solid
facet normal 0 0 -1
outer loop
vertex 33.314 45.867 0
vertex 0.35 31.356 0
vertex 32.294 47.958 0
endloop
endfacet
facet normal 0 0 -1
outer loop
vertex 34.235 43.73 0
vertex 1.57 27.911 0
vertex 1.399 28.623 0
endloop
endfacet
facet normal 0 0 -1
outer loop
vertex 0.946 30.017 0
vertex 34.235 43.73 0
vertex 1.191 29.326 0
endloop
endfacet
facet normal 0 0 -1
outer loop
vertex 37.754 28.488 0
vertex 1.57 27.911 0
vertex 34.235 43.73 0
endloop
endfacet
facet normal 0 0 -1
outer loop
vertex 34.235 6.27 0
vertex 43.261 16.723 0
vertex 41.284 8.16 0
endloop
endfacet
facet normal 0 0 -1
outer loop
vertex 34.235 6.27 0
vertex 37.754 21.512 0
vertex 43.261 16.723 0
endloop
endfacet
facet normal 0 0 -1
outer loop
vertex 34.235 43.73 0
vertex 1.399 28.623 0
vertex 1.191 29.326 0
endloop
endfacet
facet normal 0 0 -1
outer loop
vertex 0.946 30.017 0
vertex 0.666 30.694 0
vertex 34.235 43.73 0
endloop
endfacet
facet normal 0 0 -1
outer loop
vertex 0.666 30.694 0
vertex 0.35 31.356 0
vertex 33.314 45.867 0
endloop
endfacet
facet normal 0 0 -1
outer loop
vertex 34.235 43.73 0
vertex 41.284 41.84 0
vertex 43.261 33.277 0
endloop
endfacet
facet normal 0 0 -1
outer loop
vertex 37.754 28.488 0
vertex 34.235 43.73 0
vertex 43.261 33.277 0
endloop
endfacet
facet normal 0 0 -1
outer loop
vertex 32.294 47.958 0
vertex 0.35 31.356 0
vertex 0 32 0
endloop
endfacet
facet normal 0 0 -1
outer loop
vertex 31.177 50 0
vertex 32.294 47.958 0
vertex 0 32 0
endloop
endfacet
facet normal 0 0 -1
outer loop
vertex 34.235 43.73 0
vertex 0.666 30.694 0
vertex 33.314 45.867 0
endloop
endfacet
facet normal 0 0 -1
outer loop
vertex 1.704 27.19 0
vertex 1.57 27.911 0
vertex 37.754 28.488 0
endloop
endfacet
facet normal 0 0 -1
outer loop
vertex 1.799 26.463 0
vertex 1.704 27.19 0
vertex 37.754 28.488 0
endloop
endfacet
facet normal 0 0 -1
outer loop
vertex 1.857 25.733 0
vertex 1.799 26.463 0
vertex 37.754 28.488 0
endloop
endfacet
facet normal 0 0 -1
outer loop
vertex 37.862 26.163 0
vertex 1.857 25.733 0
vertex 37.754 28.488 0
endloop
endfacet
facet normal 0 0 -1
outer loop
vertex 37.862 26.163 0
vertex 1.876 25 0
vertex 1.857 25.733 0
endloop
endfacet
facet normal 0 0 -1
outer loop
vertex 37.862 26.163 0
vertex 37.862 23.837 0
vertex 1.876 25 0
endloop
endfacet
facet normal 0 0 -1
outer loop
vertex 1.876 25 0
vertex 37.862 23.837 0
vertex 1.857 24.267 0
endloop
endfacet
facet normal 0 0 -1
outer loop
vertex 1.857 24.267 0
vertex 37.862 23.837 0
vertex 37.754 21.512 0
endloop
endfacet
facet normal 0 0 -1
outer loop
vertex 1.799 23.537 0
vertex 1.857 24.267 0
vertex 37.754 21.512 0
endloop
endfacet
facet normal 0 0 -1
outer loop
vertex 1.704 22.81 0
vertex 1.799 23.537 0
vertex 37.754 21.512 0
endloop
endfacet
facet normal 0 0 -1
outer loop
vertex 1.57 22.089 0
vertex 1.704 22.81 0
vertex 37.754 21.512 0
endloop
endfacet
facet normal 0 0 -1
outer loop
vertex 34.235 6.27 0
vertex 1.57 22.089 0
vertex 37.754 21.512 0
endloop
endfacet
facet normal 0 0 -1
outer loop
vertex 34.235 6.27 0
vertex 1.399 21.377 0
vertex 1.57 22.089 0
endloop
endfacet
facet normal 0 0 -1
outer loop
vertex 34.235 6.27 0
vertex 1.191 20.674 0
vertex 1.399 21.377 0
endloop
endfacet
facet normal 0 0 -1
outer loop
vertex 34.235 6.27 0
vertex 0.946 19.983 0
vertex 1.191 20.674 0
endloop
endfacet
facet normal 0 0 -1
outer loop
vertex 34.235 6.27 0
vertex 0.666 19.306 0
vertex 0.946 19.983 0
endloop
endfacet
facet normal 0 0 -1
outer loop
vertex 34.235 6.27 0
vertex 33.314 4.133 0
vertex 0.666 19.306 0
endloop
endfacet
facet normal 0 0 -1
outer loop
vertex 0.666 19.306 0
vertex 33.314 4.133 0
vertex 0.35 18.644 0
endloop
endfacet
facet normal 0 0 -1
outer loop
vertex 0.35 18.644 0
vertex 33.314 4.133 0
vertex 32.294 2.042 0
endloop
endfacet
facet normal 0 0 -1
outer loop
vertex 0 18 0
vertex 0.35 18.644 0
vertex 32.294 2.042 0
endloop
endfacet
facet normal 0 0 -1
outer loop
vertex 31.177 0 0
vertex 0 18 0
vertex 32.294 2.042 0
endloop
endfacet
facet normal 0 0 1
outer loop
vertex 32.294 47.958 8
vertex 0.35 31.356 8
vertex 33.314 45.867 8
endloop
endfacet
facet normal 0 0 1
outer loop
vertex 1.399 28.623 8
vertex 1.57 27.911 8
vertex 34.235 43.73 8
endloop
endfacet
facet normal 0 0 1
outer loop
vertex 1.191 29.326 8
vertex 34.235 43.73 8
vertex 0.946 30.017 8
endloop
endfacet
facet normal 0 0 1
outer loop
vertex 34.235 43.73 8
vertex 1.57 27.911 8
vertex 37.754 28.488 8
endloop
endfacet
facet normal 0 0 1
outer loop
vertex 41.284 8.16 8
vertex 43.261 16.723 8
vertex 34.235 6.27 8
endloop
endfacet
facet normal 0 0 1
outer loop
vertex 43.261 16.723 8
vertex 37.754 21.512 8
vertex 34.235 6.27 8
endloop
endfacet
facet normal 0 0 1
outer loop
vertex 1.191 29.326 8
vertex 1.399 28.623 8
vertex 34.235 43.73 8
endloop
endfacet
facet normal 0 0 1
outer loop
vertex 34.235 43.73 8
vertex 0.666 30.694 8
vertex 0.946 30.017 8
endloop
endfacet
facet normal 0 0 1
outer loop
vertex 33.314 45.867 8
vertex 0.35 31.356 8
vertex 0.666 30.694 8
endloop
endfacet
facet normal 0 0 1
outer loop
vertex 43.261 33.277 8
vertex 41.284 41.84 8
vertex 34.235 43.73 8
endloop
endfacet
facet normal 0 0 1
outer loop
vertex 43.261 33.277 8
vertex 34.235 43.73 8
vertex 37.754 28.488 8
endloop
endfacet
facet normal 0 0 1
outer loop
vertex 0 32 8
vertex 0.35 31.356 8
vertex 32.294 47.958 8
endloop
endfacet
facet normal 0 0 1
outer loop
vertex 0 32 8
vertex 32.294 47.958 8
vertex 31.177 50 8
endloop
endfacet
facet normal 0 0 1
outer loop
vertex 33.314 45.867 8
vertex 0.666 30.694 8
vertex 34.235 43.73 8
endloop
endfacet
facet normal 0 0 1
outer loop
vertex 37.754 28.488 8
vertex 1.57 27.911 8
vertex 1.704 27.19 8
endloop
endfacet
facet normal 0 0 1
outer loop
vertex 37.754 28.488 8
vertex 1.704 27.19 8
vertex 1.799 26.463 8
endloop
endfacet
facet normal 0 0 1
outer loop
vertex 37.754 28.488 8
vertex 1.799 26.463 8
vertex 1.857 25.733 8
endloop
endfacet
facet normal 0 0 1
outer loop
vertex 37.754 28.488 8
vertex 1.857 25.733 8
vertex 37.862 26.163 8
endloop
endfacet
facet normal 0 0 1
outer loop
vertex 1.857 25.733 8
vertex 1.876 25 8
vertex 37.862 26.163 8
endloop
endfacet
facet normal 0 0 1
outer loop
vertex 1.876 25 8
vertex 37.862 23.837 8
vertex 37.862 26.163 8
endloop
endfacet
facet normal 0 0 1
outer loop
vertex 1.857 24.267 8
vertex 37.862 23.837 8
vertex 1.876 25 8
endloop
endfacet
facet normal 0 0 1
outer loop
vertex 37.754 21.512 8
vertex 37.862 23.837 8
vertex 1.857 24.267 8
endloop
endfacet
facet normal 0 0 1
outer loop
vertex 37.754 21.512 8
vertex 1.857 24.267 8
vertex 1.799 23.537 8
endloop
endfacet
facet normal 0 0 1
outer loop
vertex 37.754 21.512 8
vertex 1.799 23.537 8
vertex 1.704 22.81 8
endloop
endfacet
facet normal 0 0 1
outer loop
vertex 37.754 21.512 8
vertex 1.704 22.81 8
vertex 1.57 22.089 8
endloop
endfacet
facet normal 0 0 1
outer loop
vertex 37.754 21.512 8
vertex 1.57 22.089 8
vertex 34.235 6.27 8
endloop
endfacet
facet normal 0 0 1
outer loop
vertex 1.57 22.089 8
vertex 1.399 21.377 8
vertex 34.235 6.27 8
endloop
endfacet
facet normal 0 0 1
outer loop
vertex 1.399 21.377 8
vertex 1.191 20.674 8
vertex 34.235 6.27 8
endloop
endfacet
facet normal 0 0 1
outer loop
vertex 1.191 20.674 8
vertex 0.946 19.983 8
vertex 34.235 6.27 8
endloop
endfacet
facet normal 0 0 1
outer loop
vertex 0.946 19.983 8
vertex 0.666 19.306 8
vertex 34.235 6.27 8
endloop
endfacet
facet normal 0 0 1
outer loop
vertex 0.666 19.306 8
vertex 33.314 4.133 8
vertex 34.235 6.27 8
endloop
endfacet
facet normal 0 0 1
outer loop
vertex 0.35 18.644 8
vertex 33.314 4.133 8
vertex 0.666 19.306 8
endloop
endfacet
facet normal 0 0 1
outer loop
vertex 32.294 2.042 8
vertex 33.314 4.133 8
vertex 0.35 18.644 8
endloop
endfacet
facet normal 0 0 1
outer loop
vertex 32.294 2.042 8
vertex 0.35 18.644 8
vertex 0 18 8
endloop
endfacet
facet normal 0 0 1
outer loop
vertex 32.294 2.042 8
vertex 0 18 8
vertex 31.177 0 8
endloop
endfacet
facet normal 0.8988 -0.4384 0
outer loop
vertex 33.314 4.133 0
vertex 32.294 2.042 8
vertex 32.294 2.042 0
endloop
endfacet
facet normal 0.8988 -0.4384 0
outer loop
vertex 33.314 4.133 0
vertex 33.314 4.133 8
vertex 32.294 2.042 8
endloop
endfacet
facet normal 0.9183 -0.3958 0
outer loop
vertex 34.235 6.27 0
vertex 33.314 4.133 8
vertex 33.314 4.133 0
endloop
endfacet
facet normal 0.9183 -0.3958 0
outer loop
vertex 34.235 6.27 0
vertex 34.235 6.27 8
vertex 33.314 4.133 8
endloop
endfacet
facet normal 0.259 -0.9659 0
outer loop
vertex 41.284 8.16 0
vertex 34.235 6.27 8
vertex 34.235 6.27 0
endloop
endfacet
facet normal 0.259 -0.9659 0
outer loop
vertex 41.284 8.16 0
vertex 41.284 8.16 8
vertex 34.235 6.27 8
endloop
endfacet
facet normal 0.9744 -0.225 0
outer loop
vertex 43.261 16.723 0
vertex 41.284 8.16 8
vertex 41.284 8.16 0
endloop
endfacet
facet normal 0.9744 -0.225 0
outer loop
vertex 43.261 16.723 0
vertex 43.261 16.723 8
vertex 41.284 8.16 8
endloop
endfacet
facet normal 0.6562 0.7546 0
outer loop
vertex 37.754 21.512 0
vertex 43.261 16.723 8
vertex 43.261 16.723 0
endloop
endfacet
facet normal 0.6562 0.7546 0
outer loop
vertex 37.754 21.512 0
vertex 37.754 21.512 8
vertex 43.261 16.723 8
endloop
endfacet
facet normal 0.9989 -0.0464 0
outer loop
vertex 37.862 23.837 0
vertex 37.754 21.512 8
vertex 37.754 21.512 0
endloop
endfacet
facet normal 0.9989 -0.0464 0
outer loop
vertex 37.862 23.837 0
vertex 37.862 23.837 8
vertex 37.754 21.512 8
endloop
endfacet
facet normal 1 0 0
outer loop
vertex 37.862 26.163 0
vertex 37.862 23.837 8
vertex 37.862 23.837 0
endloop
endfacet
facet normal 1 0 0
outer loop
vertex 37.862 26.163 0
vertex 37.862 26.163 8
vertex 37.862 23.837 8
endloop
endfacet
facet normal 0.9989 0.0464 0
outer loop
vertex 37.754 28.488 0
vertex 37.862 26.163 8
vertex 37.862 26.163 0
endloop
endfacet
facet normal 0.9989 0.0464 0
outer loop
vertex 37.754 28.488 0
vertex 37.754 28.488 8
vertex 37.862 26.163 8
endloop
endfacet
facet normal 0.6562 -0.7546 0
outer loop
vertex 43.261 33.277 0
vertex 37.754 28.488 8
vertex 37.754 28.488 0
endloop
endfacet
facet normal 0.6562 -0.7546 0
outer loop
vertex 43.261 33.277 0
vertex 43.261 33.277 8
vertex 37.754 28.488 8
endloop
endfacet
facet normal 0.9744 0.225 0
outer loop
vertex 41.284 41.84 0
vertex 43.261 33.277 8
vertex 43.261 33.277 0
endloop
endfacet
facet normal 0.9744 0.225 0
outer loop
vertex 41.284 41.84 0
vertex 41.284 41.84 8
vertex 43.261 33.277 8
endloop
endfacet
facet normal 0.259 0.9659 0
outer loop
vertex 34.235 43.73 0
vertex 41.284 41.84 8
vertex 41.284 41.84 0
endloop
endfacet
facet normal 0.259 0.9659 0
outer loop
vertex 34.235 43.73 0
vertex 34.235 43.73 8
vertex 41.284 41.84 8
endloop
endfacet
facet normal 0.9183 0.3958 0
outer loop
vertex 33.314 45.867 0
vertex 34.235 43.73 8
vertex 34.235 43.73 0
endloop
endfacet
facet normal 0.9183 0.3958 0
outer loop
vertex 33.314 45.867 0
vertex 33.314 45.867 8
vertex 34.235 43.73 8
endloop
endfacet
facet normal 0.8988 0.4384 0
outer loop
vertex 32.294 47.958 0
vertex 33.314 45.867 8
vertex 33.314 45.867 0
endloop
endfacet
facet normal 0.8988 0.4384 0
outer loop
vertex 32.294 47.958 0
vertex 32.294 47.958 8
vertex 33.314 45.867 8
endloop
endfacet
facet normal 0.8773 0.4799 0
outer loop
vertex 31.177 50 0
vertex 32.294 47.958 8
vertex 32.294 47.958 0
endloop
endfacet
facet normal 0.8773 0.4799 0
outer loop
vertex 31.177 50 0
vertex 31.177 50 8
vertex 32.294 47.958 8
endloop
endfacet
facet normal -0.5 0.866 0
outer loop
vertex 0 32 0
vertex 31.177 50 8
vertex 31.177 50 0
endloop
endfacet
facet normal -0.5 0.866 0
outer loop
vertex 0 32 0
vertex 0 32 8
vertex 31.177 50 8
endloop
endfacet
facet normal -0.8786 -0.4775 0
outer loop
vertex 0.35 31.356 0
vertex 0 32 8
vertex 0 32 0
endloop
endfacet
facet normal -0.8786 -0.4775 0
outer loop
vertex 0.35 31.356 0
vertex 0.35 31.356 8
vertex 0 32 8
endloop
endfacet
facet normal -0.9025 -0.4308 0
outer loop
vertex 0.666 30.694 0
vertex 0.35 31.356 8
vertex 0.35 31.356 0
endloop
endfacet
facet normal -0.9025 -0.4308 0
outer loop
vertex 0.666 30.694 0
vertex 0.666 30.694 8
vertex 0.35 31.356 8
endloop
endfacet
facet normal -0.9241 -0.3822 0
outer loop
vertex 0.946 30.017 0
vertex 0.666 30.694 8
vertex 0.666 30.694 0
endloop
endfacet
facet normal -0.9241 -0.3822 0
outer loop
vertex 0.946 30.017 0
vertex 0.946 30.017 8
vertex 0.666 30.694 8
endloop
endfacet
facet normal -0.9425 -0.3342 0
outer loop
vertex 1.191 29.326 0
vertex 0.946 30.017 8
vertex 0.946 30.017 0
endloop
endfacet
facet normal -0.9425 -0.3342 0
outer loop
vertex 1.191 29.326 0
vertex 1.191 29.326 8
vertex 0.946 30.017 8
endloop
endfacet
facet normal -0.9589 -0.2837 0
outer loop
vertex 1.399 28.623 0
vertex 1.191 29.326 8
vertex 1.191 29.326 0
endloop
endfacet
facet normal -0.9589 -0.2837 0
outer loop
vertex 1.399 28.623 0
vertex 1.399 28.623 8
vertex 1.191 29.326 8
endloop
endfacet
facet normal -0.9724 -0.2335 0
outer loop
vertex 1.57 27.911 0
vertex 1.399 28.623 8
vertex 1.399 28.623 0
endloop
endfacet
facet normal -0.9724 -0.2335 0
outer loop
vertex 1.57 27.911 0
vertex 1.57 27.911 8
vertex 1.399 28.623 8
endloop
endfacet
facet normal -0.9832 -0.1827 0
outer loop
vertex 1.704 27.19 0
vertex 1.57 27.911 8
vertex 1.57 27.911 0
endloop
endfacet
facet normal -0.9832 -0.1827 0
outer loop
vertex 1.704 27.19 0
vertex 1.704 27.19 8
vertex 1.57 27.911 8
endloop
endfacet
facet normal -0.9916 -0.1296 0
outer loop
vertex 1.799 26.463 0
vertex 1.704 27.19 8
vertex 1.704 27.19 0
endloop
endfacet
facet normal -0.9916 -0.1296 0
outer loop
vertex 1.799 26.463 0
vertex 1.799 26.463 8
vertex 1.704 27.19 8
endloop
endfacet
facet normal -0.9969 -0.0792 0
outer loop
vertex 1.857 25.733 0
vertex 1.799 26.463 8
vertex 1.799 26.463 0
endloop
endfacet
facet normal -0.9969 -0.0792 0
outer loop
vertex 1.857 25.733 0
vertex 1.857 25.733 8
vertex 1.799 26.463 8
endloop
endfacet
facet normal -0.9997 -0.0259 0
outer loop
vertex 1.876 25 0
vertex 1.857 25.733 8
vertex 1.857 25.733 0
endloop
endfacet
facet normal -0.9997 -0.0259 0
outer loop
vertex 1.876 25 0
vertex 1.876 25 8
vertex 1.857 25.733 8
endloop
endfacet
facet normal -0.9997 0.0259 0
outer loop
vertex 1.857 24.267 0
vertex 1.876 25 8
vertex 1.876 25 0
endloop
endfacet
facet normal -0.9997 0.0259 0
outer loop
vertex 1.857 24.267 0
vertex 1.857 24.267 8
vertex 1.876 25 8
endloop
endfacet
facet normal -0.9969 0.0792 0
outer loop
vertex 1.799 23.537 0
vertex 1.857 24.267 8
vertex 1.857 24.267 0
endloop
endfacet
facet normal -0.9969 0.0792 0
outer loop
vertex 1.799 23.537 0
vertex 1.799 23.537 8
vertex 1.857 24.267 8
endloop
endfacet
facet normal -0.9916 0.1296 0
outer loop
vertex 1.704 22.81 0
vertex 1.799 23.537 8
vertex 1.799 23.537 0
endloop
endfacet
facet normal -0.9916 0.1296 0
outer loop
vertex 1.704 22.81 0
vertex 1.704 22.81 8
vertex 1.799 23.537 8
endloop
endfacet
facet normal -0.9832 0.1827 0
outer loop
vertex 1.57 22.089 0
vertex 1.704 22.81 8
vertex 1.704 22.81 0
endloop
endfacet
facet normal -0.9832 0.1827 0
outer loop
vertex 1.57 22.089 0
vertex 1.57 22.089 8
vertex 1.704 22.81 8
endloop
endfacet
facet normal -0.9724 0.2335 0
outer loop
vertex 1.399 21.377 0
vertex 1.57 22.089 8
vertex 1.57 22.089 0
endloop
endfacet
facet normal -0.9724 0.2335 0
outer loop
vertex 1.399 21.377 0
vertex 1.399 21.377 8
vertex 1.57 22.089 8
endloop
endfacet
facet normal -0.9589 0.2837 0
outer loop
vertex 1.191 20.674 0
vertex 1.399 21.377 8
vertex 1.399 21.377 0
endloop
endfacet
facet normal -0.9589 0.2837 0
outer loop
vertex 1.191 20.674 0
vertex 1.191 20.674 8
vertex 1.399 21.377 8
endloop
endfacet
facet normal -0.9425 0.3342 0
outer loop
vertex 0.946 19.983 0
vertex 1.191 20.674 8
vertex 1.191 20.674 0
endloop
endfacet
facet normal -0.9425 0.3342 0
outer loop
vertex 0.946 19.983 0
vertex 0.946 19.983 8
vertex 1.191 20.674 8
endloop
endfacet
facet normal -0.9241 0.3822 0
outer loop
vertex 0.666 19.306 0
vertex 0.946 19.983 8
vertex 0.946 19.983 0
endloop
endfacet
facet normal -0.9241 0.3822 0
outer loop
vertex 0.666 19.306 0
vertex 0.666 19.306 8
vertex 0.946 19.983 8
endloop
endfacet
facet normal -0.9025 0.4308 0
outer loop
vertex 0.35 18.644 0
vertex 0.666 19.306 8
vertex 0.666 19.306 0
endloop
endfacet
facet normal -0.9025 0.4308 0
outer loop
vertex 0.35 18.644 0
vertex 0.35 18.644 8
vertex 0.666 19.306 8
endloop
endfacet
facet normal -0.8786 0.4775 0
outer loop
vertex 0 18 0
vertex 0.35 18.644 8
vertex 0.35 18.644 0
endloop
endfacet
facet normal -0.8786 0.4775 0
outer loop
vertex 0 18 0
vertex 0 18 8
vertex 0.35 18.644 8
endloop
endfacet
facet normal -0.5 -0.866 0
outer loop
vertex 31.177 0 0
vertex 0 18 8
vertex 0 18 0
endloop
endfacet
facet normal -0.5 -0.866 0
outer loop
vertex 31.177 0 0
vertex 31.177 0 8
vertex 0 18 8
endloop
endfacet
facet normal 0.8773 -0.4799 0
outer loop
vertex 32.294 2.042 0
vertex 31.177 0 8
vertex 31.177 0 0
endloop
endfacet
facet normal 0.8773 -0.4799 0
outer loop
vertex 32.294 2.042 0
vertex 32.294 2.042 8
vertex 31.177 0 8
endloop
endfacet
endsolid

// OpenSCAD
$fn = 32;

// ----------------------------------------------------------------------
// Gear sector: 2 teeth on 60 degrees
// ----------------------------------------------------------------------

// --- parameters (mm) ---
sector_angle = 60;        // sector angle, degrees
root_r = 50;              // root circle radius
tooth_h = 6;              // tooth height over the root circle
teeth = 2;                // number of teeth on the sector
hub_r = 14;               // hub bore radius
plate_t = 8;              // sector thickness, Z
arc_step = 3;             // sampling step of the root/hub arcs, degrees

tip_r = root_r + tooth_h;  // tip circle radius

profile = [[31.177, 0], [32.294, 2.042], [33.314, 4.133], [34.235, 6.27], [41.284, 8.16], [43.261, 16.723], [37.754, 21.512], [37.862, 23.837], [37.862, 26.163], [37.754, 28.488], [43.261, 33.277], [41.284, 41.84], [34.235, 43.73], [33.314, 45.867], [32.294, 47.958], [31.177, 50], [0, 32], [0.35, 31.356], [0.666, 30.694], [0.946, 30.017], [1.191, 29.326], [1.399, 28.623], [1.57, 27.911], [1.704, 27.19], [1.799, 26.463], [1.857, 25.733], [1.876, 25], [1.857, 24.267], [1.799, 23.537], [1.704, 22.81], [1.57, 22.089], [1.399, 21.377], [1.191, 20.674], [0.946, 19.983], [0.666, 19.306], [0.35, 18.644], [0, 18]];  // primary outline, 37 points, counter clockwise

// --- the one profile operation ---
linear_extrude(height = plate_t) polygon(points = profile);
